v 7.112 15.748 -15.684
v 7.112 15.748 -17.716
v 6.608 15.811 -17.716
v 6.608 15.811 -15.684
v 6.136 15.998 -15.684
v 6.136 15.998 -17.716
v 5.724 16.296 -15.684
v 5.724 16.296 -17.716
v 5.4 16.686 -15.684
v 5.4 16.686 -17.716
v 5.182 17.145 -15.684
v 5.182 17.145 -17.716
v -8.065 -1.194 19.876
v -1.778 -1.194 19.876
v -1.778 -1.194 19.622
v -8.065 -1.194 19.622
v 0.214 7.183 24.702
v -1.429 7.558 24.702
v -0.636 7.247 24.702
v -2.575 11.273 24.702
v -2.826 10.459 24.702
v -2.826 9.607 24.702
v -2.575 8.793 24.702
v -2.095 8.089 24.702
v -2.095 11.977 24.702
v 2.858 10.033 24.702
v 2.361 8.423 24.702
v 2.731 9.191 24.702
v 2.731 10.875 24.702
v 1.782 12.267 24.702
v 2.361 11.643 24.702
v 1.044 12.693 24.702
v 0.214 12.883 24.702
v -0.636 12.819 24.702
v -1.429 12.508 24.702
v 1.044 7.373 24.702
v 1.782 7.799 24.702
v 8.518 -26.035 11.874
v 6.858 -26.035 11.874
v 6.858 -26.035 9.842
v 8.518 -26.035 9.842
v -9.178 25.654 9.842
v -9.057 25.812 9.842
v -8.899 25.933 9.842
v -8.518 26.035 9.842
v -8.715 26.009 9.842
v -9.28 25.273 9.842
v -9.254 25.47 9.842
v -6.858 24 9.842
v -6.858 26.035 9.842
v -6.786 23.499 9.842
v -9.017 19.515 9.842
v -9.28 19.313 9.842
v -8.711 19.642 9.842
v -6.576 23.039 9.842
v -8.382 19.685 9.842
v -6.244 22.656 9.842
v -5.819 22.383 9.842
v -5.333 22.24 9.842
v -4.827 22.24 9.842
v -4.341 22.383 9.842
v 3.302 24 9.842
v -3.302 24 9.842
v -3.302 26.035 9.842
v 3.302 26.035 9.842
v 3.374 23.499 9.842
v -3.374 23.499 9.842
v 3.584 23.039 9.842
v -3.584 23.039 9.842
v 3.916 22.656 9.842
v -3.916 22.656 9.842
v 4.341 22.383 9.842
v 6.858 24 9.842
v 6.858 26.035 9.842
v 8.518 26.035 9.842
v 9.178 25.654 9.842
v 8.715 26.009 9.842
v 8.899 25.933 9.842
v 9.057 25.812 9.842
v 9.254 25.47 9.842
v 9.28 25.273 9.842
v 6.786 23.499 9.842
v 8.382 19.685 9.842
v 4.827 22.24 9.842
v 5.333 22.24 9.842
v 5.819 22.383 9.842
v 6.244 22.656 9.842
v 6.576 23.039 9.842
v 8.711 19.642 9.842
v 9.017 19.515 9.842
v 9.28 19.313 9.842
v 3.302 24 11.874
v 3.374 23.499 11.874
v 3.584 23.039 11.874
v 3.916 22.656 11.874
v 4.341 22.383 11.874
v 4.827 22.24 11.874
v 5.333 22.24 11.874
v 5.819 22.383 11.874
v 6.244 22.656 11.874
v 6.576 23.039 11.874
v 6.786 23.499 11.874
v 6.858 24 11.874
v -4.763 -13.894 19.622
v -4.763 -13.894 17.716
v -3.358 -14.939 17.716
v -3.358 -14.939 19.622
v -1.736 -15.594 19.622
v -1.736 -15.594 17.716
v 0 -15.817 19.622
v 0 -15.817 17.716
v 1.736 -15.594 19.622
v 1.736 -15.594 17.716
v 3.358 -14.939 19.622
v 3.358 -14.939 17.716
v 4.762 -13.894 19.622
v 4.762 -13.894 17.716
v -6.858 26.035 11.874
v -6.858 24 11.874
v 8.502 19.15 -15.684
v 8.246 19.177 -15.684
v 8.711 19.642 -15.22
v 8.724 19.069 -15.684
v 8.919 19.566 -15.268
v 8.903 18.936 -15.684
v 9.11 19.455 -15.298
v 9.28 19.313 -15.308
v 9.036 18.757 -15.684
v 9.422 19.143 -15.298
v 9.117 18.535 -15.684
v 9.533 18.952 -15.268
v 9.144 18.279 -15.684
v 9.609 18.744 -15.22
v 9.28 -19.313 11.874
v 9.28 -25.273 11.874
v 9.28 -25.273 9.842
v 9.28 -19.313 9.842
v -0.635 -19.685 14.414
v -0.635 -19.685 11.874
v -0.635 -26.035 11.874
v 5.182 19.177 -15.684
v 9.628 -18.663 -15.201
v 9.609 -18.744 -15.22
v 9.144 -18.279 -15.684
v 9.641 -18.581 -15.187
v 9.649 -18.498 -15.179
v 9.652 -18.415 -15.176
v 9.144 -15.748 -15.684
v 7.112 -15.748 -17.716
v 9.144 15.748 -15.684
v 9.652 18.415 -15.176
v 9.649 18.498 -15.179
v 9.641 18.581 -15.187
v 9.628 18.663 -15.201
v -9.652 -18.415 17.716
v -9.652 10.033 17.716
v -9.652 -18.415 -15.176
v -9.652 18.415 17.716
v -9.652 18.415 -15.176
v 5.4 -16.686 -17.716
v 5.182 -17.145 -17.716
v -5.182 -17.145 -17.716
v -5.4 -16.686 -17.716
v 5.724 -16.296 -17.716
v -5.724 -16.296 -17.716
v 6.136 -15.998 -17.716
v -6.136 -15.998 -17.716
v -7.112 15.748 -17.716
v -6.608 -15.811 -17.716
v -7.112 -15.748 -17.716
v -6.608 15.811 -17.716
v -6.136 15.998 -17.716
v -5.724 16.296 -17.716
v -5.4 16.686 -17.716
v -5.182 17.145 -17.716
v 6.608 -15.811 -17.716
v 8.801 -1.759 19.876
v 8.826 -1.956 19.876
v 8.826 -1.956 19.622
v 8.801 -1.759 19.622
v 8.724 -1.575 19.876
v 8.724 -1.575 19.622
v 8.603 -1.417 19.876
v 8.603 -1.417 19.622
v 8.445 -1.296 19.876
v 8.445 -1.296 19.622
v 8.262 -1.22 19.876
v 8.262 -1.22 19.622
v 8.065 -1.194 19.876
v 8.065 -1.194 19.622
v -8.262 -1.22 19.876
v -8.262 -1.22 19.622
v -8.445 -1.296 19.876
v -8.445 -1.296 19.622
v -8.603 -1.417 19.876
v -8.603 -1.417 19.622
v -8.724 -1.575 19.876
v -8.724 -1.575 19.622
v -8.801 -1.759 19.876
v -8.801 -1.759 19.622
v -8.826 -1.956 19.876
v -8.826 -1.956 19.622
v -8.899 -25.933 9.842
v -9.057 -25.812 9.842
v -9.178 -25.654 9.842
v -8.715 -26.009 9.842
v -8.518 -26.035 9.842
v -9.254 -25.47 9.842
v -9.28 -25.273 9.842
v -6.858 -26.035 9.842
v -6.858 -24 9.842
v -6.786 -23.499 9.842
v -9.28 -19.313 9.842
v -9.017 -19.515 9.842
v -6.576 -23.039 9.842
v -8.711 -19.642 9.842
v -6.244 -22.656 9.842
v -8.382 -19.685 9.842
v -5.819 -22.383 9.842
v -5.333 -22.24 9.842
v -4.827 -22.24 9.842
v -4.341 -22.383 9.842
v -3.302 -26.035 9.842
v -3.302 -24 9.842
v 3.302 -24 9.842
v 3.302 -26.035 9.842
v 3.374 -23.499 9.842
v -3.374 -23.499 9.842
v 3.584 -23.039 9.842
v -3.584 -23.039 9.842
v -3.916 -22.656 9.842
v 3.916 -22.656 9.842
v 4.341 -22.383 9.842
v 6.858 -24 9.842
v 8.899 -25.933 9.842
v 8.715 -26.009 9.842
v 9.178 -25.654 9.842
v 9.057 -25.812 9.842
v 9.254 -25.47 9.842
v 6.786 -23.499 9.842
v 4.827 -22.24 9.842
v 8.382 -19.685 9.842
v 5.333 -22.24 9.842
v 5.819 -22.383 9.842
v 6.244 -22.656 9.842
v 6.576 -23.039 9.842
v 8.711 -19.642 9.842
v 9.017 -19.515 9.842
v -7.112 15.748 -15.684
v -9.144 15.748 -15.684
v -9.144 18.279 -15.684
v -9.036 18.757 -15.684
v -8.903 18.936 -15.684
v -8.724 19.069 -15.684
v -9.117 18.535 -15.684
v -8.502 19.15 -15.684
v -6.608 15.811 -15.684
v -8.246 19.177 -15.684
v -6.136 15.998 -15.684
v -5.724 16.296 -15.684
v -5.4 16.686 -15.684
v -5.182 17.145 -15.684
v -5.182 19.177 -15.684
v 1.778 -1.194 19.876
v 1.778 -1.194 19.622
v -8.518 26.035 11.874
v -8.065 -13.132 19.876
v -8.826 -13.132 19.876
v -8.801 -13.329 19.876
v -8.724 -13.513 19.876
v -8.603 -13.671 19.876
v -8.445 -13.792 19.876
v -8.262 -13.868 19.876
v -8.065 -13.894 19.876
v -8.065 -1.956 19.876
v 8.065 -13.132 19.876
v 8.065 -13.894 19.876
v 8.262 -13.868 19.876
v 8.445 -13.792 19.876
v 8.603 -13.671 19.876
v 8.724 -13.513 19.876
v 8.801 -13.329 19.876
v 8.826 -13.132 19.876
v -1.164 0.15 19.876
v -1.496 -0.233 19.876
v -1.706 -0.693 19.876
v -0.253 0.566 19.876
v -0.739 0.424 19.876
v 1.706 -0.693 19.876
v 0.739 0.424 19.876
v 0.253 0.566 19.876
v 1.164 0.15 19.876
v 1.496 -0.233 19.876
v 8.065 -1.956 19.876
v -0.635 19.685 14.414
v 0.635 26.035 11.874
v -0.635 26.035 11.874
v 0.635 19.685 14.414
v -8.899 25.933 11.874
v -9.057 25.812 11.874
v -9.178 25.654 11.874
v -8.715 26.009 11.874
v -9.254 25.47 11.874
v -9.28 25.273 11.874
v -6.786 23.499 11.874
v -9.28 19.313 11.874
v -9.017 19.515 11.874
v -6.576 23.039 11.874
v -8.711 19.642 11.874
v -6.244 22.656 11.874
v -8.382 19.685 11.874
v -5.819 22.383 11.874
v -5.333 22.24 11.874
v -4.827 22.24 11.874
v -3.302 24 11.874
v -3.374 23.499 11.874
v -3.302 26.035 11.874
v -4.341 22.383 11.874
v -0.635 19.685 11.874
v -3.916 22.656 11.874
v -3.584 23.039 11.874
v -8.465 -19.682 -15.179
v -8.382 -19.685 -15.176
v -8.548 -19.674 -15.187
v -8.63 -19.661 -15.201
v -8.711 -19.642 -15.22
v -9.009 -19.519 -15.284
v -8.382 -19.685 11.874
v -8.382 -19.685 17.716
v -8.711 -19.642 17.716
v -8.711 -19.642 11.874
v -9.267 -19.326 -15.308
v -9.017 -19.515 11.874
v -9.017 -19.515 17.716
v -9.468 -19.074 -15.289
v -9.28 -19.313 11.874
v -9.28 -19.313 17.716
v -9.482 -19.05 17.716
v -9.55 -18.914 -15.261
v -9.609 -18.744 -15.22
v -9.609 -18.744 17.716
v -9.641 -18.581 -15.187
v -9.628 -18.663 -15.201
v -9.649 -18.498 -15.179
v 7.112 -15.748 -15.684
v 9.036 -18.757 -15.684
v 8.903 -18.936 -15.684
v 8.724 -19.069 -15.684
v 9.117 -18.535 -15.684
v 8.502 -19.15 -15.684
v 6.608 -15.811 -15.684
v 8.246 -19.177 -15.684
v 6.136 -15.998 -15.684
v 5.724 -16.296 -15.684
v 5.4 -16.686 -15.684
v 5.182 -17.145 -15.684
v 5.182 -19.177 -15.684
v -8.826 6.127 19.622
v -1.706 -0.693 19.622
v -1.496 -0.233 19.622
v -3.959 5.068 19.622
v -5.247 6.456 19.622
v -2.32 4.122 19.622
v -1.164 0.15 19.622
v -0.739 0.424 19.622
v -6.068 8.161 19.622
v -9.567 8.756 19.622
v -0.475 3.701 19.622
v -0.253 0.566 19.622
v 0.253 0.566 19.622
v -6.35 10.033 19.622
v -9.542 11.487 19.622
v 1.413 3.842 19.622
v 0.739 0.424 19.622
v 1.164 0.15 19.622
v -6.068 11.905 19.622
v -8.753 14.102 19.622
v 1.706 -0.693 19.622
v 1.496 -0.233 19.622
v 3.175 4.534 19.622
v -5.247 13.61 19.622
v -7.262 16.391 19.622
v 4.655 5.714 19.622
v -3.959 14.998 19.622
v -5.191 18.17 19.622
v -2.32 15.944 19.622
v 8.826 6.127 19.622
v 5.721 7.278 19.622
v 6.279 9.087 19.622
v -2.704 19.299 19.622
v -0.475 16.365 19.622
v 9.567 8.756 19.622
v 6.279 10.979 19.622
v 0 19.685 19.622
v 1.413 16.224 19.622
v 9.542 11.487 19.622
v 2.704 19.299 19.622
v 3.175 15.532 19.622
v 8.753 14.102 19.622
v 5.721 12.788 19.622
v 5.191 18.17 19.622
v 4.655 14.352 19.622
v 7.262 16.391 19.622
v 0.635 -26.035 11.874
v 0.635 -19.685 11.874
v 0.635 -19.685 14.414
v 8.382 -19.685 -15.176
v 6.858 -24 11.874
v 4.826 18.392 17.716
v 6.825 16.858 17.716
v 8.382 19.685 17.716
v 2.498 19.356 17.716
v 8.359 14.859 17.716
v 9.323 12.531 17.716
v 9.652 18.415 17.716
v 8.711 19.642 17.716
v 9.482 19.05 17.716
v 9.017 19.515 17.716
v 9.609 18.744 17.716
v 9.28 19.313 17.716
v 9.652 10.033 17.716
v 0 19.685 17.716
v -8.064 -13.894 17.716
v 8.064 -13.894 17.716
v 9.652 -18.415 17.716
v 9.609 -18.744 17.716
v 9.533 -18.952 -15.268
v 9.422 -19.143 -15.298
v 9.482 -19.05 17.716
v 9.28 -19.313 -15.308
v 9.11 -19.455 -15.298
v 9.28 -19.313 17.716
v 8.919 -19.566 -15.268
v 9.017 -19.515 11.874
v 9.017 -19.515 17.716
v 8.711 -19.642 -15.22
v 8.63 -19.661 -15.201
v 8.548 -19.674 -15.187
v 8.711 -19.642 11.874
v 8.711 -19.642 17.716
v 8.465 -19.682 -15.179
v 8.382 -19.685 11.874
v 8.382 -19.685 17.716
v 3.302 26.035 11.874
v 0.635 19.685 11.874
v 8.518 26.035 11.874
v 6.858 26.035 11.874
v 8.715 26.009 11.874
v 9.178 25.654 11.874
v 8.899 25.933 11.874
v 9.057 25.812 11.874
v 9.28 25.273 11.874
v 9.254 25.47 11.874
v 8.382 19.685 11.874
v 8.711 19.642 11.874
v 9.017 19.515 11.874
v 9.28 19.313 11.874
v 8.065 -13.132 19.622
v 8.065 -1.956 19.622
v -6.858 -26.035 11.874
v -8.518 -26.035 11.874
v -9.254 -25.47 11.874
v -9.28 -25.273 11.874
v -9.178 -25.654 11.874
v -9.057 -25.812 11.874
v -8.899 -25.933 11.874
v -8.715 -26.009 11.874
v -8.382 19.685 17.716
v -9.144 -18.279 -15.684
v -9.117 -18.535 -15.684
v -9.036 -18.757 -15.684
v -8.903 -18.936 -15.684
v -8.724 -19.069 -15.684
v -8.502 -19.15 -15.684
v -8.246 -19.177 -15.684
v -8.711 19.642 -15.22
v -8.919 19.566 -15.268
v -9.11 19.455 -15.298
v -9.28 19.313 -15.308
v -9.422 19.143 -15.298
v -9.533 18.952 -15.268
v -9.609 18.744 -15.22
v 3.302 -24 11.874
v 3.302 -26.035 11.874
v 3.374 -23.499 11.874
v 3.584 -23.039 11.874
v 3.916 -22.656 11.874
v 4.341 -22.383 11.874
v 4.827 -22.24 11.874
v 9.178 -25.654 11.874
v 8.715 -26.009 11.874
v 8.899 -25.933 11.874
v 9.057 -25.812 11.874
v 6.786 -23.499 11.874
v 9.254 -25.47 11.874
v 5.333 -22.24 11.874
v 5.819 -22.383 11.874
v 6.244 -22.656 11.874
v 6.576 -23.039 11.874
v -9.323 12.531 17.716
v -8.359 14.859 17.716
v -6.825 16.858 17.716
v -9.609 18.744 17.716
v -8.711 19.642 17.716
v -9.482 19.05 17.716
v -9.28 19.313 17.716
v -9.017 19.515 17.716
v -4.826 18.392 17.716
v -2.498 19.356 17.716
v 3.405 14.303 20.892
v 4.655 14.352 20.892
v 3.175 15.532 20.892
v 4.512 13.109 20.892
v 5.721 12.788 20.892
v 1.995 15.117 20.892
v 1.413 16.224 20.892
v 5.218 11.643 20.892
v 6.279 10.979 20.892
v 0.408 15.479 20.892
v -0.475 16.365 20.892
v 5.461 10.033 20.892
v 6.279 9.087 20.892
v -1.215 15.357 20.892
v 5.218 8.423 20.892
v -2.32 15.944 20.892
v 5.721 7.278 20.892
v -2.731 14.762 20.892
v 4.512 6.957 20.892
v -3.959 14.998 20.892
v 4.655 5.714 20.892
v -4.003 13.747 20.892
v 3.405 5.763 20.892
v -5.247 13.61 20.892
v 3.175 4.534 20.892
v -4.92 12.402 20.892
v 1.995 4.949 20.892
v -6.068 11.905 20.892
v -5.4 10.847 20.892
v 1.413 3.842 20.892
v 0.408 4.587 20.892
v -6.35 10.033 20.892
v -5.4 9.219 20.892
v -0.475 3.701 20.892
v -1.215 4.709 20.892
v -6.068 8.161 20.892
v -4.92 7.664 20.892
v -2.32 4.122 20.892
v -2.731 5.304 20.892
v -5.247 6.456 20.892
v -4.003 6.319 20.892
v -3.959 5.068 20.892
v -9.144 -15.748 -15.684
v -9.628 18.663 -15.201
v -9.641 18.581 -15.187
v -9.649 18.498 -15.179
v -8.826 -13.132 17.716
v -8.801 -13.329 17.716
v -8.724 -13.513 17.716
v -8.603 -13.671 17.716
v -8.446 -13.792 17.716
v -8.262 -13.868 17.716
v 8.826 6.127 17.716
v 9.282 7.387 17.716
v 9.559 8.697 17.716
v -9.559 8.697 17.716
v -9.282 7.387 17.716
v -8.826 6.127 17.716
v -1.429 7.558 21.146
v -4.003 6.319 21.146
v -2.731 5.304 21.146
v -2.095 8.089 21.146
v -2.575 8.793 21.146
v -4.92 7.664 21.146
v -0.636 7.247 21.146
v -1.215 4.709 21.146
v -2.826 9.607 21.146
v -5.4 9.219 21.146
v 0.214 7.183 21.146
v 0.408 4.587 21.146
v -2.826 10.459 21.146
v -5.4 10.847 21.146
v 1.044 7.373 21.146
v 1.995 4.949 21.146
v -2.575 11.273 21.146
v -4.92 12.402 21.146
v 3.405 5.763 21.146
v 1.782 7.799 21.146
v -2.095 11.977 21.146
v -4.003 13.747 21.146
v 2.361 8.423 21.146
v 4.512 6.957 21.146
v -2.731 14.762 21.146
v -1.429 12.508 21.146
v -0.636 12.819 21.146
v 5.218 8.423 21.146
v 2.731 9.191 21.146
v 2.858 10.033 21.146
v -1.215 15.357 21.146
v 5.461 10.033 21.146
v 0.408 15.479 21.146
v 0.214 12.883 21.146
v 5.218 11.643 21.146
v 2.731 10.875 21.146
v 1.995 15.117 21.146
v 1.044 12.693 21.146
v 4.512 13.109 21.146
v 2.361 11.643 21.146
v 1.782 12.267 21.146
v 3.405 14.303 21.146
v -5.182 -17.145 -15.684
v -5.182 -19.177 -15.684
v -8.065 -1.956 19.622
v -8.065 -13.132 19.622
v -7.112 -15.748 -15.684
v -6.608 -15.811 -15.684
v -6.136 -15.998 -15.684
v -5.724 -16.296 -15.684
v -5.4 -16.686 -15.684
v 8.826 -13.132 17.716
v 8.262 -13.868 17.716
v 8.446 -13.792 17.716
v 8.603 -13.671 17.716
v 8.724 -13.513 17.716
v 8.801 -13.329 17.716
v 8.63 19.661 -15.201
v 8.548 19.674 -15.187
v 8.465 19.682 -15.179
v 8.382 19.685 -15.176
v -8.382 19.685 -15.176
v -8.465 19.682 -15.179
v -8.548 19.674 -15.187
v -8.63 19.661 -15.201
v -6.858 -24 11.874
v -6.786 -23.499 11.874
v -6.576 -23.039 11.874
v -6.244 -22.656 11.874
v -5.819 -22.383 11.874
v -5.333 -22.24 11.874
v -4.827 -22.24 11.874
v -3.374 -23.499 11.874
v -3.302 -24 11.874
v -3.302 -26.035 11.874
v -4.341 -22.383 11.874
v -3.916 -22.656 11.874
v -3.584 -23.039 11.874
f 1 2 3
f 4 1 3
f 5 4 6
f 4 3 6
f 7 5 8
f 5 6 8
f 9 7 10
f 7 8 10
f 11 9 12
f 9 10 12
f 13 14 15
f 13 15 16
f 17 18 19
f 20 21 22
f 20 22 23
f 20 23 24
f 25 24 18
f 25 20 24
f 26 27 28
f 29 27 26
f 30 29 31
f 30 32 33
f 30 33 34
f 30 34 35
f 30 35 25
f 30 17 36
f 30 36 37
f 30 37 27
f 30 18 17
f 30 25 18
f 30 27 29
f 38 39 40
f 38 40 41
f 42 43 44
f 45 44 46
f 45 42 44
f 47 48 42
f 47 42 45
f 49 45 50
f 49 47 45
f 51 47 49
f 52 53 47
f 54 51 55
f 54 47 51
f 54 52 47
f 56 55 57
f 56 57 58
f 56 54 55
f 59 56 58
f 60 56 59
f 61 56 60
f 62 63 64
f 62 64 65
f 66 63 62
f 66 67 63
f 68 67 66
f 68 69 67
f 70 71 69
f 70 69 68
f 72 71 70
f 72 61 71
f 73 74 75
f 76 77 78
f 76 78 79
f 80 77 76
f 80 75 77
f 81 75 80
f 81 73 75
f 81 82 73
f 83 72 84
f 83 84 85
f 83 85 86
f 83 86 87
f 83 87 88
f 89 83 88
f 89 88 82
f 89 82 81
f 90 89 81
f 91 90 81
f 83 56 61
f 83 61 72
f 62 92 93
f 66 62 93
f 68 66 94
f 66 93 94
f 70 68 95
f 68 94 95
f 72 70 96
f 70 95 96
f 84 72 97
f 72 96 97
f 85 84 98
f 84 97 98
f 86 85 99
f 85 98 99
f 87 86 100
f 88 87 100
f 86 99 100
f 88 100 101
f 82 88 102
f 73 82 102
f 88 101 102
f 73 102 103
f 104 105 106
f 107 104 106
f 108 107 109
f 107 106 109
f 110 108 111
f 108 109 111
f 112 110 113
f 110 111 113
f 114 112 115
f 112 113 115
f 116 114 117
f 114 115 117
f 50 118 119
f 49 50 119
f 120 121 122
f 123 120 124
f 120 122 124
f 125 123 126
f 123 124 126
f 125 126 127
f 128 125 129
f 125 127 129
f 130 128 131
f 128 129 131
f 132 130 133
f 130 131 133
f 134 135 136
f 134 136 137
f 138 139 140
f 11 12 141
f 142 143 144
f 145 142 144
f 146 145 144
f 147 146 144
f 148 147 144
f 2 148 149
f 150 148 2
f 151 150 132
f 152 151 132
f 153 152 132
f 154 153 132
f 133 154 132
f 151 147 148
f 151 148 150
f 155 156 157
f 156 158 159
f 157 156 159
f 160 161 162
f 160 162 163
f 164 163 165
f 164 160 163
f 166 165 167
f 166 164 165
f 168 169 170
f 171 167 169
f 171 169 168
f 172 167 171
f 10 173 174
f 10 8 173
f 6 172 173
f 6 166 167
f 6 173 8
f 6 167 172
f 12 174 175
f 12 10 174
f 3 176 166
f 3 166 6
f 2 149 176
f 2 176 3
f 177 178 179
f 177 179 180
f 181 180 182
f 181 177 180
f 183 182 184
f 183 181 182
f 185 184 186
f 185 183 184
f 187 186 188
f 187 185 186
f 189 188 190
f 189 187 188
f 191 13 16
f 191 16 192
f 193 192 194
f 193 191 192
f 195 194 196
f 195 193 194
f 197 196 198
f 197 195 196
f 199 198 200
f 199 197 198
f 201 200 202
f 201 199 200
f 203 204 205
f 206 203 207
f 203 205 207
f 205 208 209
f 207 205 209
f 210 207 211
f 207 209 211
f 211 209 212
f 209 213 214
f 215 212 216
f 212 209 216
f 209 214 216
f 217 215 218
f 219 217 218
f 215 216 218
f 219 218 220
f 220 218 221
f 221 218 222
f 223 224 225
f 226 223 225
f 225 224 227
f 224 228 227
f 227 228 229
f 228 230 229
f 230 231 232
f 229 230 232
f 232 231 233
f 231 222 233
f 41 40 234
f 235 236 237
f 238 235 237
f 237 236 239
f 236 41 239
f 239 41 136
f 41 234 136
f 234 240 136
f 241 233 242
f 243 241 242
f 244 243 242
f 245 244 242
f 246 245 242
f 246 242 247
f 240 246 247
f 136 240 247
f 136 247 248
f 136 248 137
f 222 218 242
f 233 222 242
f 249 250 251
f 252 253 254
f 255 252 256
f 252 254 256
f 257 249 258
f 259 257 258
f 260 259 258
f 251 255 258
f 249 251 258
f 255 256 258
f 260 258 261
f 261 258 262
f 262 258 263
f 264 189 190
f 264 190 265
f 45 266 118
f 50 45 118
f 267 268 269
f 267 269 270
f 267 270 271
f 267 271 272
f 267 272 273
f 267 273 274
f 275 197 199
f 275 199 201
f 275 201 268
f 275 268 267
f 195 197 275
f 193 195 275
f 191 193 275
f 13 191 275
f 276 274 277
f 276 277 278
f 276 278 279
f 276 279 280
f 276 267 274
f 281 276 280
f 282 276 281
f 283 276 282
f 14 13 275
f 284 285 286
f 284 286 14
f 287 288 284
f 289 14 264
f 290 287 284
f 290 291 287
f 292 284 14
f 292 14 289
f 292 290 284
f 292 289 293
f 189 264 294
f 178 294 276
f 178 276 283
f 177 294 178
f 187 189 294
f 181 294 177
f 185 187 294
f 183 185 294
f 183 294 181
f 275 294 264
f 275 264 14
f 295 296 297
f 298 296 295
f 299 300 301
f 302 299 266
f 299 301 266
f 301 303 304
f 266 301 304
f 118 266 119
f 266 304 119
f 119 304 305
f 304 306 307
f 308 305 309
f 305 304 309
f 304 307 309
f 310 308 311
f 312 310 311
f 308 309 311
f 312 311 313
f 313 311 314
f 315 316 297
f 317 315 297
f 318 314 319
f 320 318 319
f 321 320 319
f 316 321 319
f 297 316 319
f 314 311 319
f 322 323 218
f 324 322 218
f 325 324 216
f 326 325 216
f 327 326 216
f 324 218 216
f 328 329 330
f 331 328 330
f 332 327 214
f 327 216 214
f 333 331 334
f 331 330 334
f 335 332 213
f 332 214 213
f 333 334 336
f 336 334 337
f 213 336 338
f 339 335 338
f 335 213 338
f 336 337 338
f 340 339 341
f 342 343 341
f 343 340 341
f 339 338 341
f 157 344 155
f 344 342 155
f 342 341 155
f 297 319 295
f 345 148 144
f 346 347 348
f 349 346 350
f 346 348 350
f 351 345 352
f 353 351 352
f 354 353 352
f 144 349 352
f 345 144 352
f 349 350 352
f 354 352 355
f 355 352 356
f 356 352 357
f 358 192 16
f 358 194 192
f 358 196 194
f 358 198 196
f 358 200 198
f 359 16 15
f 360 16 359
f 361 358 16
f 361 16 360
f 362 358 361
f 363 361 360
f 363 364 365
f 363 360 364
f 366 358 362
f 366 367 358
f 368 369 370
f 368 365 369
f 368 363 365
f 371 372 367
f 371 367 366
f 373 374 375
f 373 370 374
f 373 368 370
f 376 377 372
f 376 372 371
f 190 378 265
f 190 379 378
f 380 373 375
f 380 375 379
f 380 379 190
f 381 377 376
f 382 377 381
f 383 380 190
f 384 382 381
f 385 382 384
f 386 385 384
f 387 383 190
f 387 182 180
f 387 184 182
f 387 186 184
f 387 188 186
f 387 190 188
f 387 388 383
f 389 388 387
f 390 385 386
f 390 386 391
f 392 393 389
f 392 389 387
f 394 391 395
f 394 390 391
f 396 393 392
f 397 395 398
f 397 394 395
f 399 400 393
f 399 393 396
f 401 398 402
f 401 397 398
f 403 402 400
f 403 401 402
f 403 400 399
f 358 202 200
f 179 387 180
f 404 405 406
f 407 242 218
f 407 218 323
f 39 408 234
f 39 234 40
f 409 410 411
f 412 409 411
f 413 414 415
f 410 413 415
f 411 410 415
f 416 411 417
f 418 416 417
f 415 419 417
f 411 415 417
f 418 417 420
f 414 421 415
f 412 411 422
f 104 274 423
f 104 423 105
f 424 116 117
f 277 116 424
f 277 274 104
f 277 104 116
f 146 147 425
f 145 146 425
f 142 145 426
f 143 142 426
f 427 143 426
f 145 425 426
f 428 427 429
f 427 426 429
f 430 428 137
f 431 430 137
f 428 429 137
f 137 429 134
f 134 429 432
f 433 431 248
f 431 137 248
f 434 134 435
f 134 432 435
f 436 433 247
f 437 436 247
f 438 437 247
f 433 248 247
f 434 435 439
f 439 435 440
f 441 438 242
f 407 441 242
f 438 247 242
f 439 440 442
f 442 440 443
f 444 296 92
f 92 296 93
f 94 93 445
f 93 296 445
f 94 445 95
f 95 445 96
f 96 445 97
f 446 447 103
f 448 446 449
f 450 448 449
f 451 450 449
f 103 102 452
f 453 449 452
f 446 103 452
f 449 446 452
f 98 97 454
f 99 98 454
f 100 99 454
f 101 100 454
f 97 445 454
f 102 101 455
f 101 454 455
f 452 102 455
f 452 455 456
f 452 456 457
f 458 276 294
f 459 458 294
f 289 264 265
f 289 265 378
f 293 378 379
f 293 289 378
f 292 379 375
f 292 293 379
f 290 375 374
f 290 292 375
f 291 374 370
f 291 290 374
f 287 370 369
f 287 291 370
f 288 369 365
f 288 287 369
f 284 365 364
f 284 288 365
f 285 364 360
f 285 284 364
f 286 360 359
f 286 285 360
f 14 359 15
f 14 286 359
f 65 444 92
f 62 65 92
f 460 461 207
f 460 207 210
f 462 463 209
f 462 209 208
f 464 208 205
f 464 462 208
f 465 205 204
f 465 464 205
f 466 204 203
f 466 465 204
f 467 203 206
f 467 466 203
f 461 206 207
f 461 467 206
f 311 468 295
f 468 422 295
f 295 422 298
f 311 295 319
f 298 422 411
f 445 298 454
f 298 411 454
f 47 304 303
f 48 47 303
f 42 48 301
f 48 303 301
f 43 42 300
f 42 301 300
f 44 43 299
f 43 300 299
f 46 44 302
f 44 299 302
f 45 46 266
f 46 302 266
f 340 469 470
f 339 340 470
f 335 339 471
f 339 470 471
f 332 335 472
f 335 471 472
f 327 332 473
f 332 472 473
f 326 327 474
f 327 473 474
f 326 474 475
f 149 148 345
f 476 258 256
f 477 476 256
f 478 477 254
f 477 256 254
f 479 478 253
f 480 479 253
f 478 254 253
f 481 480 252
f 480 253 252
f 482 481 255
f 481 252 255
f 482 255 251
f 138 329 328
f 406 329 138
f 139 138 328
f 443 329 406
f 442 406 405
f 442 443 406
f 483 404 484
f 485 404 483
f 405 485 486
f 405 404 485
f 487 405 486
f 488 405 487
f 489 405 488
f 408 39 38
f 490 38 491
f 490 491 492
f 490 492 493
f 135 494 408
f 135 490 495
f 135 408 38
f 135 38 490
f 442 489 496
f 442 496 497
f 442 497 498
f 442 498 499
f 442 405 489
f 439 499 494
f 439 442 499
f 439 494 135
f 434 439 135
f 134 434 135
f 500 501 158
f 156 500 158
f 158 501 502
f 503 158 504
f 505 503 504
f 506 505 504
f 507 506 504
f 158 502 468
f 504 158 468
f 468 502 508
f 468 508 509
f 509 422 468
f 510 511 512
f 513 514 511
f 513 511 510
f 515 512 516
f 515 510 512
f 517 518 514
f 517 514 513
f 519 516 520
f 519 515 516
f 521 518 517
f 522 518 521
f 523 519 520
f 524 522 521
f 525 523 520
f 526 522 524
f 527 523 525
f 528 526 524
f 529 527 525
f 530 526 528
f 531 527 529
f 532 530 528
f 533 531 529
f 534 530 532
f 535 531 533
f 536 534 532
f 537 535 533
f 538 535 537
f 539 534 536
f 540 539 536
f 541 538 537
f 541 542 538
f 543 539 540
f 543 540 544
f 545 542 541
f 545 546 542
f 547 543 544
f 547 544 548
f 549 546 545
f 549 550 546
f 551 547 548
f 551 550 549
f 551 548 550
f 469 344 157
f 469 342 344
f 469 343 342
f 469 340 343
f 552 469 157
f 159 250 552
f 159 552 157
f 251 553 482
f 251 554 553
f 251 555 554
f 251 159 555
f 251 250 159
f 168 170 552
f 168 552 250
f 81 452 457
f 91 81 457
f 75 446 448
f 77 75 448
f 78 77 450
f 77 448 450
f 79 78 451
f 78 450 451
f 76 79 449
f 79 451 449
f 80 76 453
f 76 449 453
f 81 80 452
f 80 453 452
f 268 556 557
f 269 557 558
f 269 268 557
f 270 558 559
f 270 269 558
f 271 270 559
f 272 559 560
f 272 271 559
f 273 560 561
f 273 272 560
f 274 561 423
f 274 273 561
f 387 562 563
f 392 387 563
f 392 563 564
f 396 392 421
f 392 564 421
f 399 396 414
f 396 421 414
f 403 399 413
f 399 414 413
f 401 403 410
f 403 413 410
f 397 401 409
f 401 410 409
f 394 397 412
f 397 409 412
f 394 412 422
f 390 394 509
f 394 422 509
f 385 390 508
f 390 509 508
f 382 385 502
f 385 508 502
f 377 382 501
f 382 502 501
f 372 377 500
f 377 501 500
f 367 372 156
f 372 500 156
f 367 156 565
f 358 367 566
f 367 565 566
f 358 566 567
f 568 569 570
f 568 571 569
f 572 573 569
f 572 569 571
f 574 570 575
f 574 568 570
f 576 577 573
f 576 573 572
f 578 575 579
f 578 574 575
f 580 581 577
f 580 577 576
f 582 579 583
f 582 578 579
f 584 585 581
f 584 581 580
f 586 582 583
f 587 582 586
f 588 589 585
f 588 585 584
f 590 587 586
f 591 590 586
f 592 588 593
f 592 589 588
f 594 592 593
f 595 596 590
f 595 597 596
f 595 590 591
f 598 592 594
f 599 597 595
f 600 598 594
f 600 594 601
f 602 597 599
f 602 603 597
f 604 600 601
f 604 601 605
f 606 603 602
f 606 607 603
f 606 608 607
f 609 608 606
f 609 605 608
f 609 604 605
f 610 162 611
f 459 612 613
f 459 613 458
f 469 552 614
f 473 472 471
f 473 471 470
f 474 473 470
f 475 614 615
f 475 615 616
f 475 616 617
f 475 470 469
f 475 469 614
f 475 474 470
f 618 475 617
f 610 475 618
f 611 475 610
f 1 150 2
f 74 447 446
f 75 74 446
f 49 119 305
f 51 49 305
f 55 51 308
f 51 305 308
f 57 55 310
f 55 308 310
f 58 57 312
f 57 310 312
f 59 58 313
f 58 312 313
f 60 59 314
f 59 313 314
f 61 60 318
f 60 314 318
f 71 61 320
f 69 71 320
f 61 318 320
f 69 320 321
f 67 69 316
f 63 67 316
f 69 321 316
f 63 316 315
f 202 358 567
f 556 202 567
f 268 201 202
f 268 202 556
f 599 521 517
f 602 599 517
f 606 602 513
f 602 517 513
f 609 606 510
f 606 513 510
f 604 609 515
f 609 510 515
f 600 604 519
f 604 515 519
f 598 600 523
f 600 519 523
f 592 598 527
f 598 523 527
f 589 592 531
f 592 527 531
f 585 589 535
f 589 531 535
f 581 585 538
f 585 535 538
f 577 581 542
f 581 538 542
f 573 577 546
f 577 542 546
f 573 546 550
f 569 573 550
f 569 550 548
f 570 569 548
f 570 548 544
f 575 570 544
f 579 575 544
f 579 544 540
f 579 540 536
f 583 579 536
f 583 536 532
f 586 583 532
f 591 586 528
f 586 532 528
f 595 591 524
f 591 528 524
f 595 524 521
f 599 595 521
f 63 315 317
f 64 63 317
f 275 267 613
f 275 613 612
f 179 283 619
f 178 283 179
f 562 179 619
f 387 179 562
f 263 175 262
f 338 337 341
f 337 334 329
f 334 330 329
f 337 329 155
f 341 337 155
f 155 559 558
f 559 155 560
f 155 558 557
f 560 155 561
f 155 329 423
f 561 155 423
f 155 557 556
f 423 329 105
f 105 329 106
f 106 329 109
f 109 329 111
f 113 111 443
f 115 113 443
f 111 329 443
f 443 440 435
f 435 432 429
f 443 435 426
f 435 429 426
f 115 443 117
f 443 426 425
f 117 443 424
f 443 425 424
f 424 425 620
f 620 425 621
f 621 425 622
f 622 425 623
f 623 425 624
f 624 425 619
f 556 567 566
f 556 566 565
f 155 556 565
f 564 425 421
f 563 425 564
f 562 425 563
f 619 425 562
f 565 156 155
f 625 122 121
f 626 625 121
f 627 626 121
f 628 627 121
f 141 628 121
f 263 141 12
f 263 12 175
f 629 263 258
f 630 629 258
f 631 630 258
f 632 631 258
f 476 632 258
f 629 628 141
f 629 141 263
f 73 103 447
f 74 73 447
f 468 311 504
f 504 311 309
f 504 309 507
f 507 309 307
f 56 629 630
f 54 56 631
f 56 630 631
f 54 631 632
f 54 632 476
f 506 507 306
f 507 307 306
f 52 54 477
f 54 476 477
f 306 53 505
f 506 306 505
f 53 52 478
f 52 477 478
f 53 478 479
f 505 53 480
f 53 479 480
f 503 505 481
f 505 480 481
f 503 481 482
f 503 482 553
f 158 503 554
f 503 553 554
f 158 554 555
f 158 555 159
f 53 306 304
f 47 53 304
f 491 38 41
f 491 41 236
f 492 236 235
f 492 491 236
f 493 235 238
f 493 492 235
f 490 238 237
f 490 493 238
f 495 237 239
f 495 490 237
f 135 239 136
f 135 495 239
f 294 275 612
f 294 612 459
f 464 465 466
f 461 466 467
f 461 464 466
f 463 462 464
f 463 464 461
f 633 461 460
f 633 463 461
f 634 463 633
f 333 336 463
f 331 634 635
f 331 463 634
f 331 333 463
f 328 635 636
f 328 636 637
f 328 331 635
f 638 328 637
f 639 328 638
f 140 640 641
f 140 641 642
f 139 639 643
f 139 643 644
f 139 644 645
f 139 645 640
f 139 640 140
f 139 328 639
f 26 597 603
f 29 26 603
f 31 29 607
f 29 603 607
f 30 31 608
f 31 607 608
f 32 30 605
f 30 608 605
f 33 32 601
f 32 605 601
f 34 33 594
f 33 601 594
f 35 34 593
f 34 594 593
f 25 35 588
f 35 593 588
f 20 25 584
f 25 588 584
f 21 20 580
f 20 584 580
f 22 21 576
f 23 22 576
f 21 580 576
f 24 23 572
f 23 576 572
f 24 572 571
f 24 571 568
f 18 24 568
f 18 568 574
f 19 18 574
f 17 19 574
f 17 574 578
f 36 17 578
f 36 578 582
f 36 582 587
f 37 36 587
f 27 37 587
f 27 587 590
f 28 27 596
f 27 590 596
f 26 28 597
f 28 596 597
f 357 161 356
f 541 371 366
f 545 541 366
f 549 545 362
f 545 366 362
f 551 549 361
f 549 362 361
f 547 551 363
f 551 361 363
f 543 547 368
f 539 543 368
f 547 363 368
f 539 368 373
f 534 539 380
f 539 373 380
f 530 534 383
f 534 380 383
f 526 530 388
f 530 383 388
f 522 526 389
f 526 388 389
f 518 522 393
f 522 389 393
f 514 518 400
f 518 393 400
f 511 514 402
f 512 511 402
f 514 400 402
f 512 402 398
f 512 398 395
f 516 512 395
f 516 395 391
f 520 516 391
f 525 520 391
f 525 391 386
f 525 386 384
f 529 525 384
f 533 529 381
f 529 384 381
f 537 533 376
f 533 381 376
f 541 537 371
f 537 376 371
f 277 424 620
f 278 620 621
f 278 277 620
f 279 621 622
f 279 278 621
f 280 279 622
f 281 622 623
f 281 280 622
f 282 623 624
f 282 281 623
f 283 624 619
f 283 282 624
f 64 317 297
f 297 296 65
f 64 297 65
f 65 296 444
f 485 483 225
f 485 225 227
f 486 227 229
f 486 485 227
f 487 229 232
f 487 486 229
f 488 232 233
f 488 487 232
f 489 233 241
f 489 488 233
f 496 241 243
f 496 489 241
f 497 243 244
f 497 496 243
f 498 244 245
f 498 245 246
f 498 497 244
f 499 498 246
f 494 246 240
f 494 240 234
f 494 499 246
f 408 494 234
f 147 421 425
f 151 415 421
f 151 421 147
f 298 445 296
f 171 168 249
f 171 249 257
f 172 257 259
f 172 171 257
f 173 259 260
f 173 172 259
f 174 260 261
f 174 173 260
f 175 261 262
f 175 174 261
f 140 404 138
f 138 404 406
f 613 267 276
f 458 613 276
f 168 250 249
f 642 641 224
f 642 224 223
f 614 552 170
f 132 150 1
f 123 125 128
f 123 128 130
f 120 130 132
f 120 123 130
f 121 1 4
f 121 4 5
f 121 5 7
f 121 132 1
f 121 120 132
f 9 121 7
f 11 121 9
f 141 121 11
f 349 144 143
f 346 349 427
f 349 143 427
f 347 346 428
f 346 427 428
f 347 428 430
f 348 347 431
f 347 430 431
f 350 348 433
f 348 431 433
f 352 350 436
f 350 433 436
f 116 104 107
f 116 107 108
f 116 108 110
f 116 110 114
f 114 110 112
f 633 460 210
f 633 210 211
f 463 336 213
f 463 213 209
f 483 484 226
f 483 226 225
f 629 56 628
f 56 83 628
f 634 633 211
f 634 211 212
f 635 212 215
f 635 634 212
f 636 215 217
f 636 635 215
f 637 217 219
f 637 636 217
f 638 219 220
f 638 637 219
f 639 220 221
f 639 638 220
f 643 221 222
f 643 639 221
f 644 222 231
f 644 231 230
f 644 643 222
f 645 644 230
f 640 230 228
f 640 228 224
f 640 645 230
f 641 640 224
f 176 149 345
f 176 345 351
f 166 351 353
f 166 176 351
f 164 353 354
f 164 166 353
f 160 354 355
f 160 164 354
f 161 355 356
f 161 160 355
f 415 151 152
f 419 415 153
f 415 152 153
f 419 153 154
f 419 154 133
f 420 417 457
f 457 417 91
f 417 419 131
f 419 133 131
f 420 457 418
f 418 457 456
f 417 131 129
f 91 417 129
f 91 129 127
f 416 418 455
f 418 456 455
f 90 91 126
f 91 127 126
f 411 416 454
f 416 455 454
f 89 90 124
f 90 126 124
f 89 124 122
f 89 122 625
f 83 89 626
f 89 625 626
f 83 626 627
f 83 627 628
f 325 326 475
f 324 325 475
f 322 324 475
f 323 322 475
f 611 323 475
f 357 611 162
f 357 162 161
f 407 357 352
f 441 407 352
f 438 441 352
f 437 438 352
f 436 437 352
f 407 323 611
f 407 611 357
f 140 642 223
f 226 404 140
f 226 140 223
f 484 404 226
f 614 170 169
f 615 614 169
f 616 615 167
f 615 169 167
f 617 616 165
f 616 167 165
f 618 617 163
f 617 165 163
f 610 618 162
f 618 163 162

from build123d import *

# Parameters (mm, degrees)
SKETCH1_W            = 35.433
SKETCH1_H            = 39.37
BOSS_EXTRUDE1_DEPTH  = 9.652
BOSS_EXTRUDE2_DEPTH  = 1.905
SKETCH3_R            = 6.35
BOSS_EXTRUDE3_DEPTH  = 1.27
SKETCH4_R            = 5.461
BOSS_EXTRUDE4_DEPTH  = 0.254
SKETCH6_R            = 2.8575
BOSS_EXTRUDE5_DEPTH  = 3.556
FILLET1_R            = 0.762
BOSS_EXTRUDE6_START  = 0.254
SKETCH7_W            = 16.129
SKETCH7_H            = 11.176
BOSS_EXTRUDE6_DEPTH  = 0.254
CHAMFER1_SIZE        = 2.54
FILLET3_R            = 1.27
FILLET4_R            = 1.27
CUT_EXTRUDE1_DEPTH   = 2.032
MIRROR2_COPY_1_DEPTH = 2.032
BOSS_EXTRUDE7_DEPTH  = 2.032
BOSS_EXTRUDE8_DEPTH  = 0.635


with BuildPart() as part:
    # Sketch1 → Boss-Extrude1 (new, symmetric)
    with BuildSketch(Plane(origin=(0, 0, 0), x_dir=(0, 0, -1), z_dir=(1, 0, 0))):
        Rectangle(SKETCH1_W, SKETCH1_H)
    extrude(amount=BOSS_EXTRUDE1_DEPTH, both=True)

    # Sketch2 → Boss-Extrude2 (add)
    with BuildSketch(Plane.XY.offset(17.7165)):
        with BuildLine():
            Line((-8.8265, 6.127362824), (-8.8265, -13.8938))
            Line((-8.8265, -13.8938), (-4.7625, -13.8938))
            ThreePointArc((-4.7625, -13.8938), (0, -15.817151304), (4.7625, -13.8938))
            Line((4.7625, -13.8938), (8.8265, -13.8938))
            Line((8.8265, -13.8938), (8.8265, 6.127362824))
            ThreePointArc((8.8265, 6.127362824), (0, 19.685), (-8.8265, 6.127362824))
        make_face()
    extrude(amount=BOSS_EXTRUDE2_DEPTH)

    # Sketch3 → Boss-Extrude3 (add)
    with BuildSketch(Plane.XY.offset(19.6215)):
        with Locations(Location((0, 10.033, 0), (0, 0, 180))):
            Circle(SKETCH3_R)
    extrude(amount=BOSS_EXTRUDE3_DEPTH)

    # Sketch4 → Boss-Extrude4 (add)
    with BuildSketch(Plane.XY.offset(20.8915)):
        with Locations((0, 10.033)):
            Circle(SKETCH4_R)
    extrude(amount=BOSS_EXTRUDE4_DEPTH)

    # Sketch6 → Boss-Extrude5 (add)
    with BuildSketch(Plane.XY.offset(21.1455)):
        with Locations((0, 10.033)):
            Circle(SKETCH6_R)
    extrude(amount=BOSS_EXTRUDE5_DEPTH)

    # Fillet1
    fillet1_edges = [part.edges().sort_by_distance(p)[0] for p in [
        (-8.8265, -13.8938, 18.669),
        (8.8265, -13.8938, 18.669),
    ]]
    fillet(fillet1_edges, radius=FILLET1_R)

    # Sketch7 → Boss-Extrude6 (add)
    with BuildSketch(Plane.XY.offset(19.6215).offset(BOSS_EXTRUDE6_START)):
        with BuildLine():
            Line((8.8265, -13.1318), (8.8265, -1.9558))
            ThreePointArc((8.8265, -1.9558), (8.603315367, -1.416984633), (8.0645, -1.1938))
            Line((8.0645, -1.1938), (1.778, -1.1938))
            ThreePointArc((1.778, -1.1938), (0, 0.5842), (-1.778, -1.1938))
            Line((-1.778, -1.1938), (-8.0645, -1.1938))
            ThreePointArc((-8.0645, -1.1938), (-8.603315367, -1.416984633), (-8.8265, -1.9558))
            Line((-8.8265, -1.9558), (-8.8265, -13.1318))
            ThreePointArc((-8.8265, -13.1318), (-8.603315367, -13.670615367), (-8.0645, -13.8938))
            Line((-8.0645, -13.8938), (8.0645, -13.8938))
            ThreePointArc((8.0645, -13.8938), (8.603315367, -13.670615367), (8.8265, -13.1318))
        make_face()
        with Locations((0, -7.5438)):
            Rectangle(SKETCH7_W, SKETCH7_H, mode=Mode.SUBTRACT)
    extrude(amount=-BOSS_EXTRUDE6_DEPTH)

    # Chamfer1
    chamfer1_edges = [part.edges().sort_by_distance(p)[0] for p in [
        (9.652, 0, -17.7165),
        (-9.652, 0, -17.7165),
        (0, 19.685, -17.7165),
        (0, -19.685, -17.7165),
    ]]
    chamfer(chamfer1_edges, length=CHAMFER1_SIZE)

    # Fillet3
    # the kernel refuses this fillet: 1.27 mm, written as the material it takes off along each edge
    with BuildSketch(Plane(origin=(9.652, 19.685, -18.3515), x_dir=(0, -1, 0), z_dir=(0, 0, 1))) as fillet3_piece_1:
        with BuildLine():
            CenterArc((FILLET3_R, -FILLET3_R), FILLET3_R, 90, 90)
            Line((0, -FILLET3_R), (0, 0))
            Line((0, 0), (FILLET3_R, 0))
        make_face()
    extrude(amount=39.243, mode=Mode.SUBTRACT)
    with BuildSketch(Plane(origin=(10.710333333, 20.743333333, -14.118166667), x_dir=(0.408248290463863, -0.816496580927726, 0.408248290463863), z_dir=(-0.5773502691896258, -0.5773502691896257, -0.5773502691896257))) as fillet3_piece_2:
        with BuildLine():
            CenterArc((FILLET3_R * 0.57735026919, FILLET3_R), FILLET3_R, 210, 60)
            Line((-FILLET3_R * 0.288675134595, FILLET3_R * 0.5), (0, 0))
            Line((0, 0), (FILLET3_R * 0.57735026919, 0))
        make_face()
    extrude(amount=8.065583261, mode=Mode.SUBTRACT)

    # Fillet4
    # the kernel refuses this fillet: 1.27 mm, written as the material it takes off along each edge
    with BuildSketch(Plane(origin=(-9.652, 19.685, -18.3515), x_dir=(0, -1, 0), z_dir=(0, 0, 1))) as fillet4_piece_1:
        with BuildLine():
            CenterArc((FILLET4_R, FILLET4_R), FILLET4_R, 180, 90)
            Line((0, FILLET4_R), (0, 0))
            Line((0, 0), (FILLET4_R, 0))
        make_face()
    extrude(amount=39.243, mode=Mode.SUBTRACT)
    with BuildSketch(Plane(origin=(-6.053666667, 16.086666667, -18.774833333), x_dir=(0.816496580927726, 0.40824829046386296, 0.40824829046386296), z_dir=(-0.5773502691896257, 0.5773502691896258, 0.5773502691896258)), Plane(origin=(10.710333333, -20.743333333, -14.118166667), x_dir=(0.4082482904638618, 0.816496580927726, 0.40824829046386424), z_dir=(-0.5773502691896258, 0.5773502691896257, -0.5773502691896257))) as fillet4_piece_2:
        with BuildLine():
            CenterArc((FILLET4_R * 0.57735026919, -FILLET4_R), FILLET4_R, 90, 60)
            Line((-FILLET4_R * 0.288675134595, -FILLET4_R * 0.5), (0, 0))
            Line((0, 0), (FILLET4_R * 0.57735026919, 0))
        make_face()
    extrude(amount=8.065583261, mode=Mode.SUBTRACT)
    with BuildSketch(Plane(origin=(-6.053666667, -16.086666667, -18.774833333), x_dir=(0.8164965809277258, -0.4082482904638633, 0.4082482904638633), z_dir=(-0.5773502691896261, -0.5773502691896256, 0.5773502691896256))) as fillet4_piece_3:
        with BuildLine():
            CenterArc((FILLET4_R * 0.57735026919, FILLET4_R), FILLET4_R, 210, 60)
            Line((-FILLET4_R * 0.288675134595, FILLET4_R * 0.5), (0, 0))
            Line((0, 0), (FILLET4_R * 0.57735026919, 0))
        make_face()
    extrude(amount=8.065583261, mode=Mode.SUBTRACT)
    with BuildSketch(Plane(origin=(-9.652, -19.685, 20.8915), x_dir=(1, 0, 0), z_dir=(0, 0, -1)), Plane(origin=(9.652, -19.685, 20.8915), x_dir=(0, 1, 0), z_dir=(0, 0, -1))) as fillet4_piece_4:
        with BuildLine():
            CenterArc((FILLET4_R, -FILLET4_R), FILLET4_R, 90, 90)
            Line((0, -FILLET4_R), (0, 0))
            Line((0, 0), (FILLET4_R, 0))
        make_face()
    extrude(amount=39.243, mode=Mode.SUBTRACT)

    # Sketch9 → Cut-Extrude1 (cut)
    with BuildSketch(Plane(origin=(0, 0, -17.7165), x_dir=(-1, 0, 0), z_dir=(0, 0, -1))):
        with BuildLine():
            Line((-5.181767112, 17.145), (-5.181767112, 19.685))
            Line((-5.181767112, 19.685), (-9.652, 19.685))
            Line((-9.652, 19.685), (-9.652, 15.748))
            Line((-9.652, 15.748), (-7.112, 15.748))
            ThreePointArc((-7.112, 15.748), (-5.920634397, 16.133891863), (-5.181767112, 17.145))
        make_face()
    cut_extrude1 = extrude(amount=-CUT_EXTRUDE1_DEPTH, mode=Mode.SUBTRACT)

    # Mirror1: Cut-Extrude1 across plane
    add(cut_extrude1.mirror(Plane.ZX), mode=Mode.SUBTRACT)

    # Mirror2: Cut-Extrude1 across plane
    add(cut_extrude1.mirror(Plane(origin=(0, 0, 0), x_dir=(0, 0, 1), z_dir=(1, 0, 0))), mode=Mode.SUBTRACT)

    # Mirror2 copy 1 sketch → Mirror2 copy 1 (cut)
    with BuildSketch(Plane(origin=(0, 0, -17.7165), x_dir=(1, 0, 0), z_dir=(0, 0, -1))):
        with BuildLine():
            Line((-5.181767112, 17.145), (-5.181767112, 19.685))
            Line((-5.181767112, 19.685), (-9.652, 19.685))
            Line((-9.652, 19.685), (-9.652, 15.748))
            Line((-9.652, 15.748), (-7.112, 15.748))
            ThreePointArc((-7.112, 15.748), (-5.920634397, 16.133891863), (-5.181767112, 17.145))
        make_face()
    extrude(amount=-MIRROR2_COPY_1_DEPTH, mode=Mode.SUBTRACT)

    # Sketch13 → Boss-Extrude7 (add)
    with BuildSketch(Plane.XY.offset(11.8745)):
        with BuildLine():
            Line((-9.280025612, -19.313025612), (-9.280025612, -25.273))
            ThreePointArc((-9.280025612, -25.273), (-9.056840979, -25.811815367), (-8.518025612, -26.035))
            Line((-8.518025612, -26.035), (-6.858, -26.035))
            Line((-6.858, -26.035), (-6.858, -24))
            ThreePointArc((-6.858, -24), (-5.08, -22.222), (-3.302, -24))
            Line((-3.302, -24), (-3.302, -26.035))
            Line((-3.302, -26.035), (3.302, -26.035))
            Line((3.302, -26.035), (3.302, -24))
            ThreePointArc((3.302, -24), (5.08, -22.222), (6.858, -24))
            Line((6.858, -24), (6.858, -26.035))
            Line((6.858, -26.035), (8.518025612, -26.035))
            ThreePointArc((8.518025612, -26.035), (9.056840979, -25.811815367), (9.280025612, -25.273))
            Line((9.280025612, -25.273), (9.280025612, -19.313025612))
            ThreePointArc((9.280025612, -19.313025612), (8.868007959, -19.588327006), (8.382, -19.685))
            Line((8.382, -19.685), (-8.382, -19.685))
            ThreePointArc((-8.382, -19.685), (-8.868007959, -19.588327006), (-9.280025612, -19.313025612))
        make_face()
    boss_extrude7 = extrude(amount=-BOSS_EXTRUDE7_DEPTH)

    # Sketch14 → Boss-Extrude8 (add, symmetric)
    with BuildSketch(Plane(origin=(0, 0, 0), x_dir=(0, 0, -1), z_dir=(1, 0, 0))):
        Polygon((-11.8745, -26.035), (-14.4145, -19.685), (-11.8745, -19.685), align=None)
    boss_extrude8 = extrude(amount=BOSS_EXTRUDE8_DEPTH, both=True)

    # Mirror3: Boss-Extrude7, Boss-Extrude8 across plane
    add(boss_extrude7.mirror(Plane.ZX))
    add(boss_extrude8.mirror(Plane.ZX))


solid = part.part
